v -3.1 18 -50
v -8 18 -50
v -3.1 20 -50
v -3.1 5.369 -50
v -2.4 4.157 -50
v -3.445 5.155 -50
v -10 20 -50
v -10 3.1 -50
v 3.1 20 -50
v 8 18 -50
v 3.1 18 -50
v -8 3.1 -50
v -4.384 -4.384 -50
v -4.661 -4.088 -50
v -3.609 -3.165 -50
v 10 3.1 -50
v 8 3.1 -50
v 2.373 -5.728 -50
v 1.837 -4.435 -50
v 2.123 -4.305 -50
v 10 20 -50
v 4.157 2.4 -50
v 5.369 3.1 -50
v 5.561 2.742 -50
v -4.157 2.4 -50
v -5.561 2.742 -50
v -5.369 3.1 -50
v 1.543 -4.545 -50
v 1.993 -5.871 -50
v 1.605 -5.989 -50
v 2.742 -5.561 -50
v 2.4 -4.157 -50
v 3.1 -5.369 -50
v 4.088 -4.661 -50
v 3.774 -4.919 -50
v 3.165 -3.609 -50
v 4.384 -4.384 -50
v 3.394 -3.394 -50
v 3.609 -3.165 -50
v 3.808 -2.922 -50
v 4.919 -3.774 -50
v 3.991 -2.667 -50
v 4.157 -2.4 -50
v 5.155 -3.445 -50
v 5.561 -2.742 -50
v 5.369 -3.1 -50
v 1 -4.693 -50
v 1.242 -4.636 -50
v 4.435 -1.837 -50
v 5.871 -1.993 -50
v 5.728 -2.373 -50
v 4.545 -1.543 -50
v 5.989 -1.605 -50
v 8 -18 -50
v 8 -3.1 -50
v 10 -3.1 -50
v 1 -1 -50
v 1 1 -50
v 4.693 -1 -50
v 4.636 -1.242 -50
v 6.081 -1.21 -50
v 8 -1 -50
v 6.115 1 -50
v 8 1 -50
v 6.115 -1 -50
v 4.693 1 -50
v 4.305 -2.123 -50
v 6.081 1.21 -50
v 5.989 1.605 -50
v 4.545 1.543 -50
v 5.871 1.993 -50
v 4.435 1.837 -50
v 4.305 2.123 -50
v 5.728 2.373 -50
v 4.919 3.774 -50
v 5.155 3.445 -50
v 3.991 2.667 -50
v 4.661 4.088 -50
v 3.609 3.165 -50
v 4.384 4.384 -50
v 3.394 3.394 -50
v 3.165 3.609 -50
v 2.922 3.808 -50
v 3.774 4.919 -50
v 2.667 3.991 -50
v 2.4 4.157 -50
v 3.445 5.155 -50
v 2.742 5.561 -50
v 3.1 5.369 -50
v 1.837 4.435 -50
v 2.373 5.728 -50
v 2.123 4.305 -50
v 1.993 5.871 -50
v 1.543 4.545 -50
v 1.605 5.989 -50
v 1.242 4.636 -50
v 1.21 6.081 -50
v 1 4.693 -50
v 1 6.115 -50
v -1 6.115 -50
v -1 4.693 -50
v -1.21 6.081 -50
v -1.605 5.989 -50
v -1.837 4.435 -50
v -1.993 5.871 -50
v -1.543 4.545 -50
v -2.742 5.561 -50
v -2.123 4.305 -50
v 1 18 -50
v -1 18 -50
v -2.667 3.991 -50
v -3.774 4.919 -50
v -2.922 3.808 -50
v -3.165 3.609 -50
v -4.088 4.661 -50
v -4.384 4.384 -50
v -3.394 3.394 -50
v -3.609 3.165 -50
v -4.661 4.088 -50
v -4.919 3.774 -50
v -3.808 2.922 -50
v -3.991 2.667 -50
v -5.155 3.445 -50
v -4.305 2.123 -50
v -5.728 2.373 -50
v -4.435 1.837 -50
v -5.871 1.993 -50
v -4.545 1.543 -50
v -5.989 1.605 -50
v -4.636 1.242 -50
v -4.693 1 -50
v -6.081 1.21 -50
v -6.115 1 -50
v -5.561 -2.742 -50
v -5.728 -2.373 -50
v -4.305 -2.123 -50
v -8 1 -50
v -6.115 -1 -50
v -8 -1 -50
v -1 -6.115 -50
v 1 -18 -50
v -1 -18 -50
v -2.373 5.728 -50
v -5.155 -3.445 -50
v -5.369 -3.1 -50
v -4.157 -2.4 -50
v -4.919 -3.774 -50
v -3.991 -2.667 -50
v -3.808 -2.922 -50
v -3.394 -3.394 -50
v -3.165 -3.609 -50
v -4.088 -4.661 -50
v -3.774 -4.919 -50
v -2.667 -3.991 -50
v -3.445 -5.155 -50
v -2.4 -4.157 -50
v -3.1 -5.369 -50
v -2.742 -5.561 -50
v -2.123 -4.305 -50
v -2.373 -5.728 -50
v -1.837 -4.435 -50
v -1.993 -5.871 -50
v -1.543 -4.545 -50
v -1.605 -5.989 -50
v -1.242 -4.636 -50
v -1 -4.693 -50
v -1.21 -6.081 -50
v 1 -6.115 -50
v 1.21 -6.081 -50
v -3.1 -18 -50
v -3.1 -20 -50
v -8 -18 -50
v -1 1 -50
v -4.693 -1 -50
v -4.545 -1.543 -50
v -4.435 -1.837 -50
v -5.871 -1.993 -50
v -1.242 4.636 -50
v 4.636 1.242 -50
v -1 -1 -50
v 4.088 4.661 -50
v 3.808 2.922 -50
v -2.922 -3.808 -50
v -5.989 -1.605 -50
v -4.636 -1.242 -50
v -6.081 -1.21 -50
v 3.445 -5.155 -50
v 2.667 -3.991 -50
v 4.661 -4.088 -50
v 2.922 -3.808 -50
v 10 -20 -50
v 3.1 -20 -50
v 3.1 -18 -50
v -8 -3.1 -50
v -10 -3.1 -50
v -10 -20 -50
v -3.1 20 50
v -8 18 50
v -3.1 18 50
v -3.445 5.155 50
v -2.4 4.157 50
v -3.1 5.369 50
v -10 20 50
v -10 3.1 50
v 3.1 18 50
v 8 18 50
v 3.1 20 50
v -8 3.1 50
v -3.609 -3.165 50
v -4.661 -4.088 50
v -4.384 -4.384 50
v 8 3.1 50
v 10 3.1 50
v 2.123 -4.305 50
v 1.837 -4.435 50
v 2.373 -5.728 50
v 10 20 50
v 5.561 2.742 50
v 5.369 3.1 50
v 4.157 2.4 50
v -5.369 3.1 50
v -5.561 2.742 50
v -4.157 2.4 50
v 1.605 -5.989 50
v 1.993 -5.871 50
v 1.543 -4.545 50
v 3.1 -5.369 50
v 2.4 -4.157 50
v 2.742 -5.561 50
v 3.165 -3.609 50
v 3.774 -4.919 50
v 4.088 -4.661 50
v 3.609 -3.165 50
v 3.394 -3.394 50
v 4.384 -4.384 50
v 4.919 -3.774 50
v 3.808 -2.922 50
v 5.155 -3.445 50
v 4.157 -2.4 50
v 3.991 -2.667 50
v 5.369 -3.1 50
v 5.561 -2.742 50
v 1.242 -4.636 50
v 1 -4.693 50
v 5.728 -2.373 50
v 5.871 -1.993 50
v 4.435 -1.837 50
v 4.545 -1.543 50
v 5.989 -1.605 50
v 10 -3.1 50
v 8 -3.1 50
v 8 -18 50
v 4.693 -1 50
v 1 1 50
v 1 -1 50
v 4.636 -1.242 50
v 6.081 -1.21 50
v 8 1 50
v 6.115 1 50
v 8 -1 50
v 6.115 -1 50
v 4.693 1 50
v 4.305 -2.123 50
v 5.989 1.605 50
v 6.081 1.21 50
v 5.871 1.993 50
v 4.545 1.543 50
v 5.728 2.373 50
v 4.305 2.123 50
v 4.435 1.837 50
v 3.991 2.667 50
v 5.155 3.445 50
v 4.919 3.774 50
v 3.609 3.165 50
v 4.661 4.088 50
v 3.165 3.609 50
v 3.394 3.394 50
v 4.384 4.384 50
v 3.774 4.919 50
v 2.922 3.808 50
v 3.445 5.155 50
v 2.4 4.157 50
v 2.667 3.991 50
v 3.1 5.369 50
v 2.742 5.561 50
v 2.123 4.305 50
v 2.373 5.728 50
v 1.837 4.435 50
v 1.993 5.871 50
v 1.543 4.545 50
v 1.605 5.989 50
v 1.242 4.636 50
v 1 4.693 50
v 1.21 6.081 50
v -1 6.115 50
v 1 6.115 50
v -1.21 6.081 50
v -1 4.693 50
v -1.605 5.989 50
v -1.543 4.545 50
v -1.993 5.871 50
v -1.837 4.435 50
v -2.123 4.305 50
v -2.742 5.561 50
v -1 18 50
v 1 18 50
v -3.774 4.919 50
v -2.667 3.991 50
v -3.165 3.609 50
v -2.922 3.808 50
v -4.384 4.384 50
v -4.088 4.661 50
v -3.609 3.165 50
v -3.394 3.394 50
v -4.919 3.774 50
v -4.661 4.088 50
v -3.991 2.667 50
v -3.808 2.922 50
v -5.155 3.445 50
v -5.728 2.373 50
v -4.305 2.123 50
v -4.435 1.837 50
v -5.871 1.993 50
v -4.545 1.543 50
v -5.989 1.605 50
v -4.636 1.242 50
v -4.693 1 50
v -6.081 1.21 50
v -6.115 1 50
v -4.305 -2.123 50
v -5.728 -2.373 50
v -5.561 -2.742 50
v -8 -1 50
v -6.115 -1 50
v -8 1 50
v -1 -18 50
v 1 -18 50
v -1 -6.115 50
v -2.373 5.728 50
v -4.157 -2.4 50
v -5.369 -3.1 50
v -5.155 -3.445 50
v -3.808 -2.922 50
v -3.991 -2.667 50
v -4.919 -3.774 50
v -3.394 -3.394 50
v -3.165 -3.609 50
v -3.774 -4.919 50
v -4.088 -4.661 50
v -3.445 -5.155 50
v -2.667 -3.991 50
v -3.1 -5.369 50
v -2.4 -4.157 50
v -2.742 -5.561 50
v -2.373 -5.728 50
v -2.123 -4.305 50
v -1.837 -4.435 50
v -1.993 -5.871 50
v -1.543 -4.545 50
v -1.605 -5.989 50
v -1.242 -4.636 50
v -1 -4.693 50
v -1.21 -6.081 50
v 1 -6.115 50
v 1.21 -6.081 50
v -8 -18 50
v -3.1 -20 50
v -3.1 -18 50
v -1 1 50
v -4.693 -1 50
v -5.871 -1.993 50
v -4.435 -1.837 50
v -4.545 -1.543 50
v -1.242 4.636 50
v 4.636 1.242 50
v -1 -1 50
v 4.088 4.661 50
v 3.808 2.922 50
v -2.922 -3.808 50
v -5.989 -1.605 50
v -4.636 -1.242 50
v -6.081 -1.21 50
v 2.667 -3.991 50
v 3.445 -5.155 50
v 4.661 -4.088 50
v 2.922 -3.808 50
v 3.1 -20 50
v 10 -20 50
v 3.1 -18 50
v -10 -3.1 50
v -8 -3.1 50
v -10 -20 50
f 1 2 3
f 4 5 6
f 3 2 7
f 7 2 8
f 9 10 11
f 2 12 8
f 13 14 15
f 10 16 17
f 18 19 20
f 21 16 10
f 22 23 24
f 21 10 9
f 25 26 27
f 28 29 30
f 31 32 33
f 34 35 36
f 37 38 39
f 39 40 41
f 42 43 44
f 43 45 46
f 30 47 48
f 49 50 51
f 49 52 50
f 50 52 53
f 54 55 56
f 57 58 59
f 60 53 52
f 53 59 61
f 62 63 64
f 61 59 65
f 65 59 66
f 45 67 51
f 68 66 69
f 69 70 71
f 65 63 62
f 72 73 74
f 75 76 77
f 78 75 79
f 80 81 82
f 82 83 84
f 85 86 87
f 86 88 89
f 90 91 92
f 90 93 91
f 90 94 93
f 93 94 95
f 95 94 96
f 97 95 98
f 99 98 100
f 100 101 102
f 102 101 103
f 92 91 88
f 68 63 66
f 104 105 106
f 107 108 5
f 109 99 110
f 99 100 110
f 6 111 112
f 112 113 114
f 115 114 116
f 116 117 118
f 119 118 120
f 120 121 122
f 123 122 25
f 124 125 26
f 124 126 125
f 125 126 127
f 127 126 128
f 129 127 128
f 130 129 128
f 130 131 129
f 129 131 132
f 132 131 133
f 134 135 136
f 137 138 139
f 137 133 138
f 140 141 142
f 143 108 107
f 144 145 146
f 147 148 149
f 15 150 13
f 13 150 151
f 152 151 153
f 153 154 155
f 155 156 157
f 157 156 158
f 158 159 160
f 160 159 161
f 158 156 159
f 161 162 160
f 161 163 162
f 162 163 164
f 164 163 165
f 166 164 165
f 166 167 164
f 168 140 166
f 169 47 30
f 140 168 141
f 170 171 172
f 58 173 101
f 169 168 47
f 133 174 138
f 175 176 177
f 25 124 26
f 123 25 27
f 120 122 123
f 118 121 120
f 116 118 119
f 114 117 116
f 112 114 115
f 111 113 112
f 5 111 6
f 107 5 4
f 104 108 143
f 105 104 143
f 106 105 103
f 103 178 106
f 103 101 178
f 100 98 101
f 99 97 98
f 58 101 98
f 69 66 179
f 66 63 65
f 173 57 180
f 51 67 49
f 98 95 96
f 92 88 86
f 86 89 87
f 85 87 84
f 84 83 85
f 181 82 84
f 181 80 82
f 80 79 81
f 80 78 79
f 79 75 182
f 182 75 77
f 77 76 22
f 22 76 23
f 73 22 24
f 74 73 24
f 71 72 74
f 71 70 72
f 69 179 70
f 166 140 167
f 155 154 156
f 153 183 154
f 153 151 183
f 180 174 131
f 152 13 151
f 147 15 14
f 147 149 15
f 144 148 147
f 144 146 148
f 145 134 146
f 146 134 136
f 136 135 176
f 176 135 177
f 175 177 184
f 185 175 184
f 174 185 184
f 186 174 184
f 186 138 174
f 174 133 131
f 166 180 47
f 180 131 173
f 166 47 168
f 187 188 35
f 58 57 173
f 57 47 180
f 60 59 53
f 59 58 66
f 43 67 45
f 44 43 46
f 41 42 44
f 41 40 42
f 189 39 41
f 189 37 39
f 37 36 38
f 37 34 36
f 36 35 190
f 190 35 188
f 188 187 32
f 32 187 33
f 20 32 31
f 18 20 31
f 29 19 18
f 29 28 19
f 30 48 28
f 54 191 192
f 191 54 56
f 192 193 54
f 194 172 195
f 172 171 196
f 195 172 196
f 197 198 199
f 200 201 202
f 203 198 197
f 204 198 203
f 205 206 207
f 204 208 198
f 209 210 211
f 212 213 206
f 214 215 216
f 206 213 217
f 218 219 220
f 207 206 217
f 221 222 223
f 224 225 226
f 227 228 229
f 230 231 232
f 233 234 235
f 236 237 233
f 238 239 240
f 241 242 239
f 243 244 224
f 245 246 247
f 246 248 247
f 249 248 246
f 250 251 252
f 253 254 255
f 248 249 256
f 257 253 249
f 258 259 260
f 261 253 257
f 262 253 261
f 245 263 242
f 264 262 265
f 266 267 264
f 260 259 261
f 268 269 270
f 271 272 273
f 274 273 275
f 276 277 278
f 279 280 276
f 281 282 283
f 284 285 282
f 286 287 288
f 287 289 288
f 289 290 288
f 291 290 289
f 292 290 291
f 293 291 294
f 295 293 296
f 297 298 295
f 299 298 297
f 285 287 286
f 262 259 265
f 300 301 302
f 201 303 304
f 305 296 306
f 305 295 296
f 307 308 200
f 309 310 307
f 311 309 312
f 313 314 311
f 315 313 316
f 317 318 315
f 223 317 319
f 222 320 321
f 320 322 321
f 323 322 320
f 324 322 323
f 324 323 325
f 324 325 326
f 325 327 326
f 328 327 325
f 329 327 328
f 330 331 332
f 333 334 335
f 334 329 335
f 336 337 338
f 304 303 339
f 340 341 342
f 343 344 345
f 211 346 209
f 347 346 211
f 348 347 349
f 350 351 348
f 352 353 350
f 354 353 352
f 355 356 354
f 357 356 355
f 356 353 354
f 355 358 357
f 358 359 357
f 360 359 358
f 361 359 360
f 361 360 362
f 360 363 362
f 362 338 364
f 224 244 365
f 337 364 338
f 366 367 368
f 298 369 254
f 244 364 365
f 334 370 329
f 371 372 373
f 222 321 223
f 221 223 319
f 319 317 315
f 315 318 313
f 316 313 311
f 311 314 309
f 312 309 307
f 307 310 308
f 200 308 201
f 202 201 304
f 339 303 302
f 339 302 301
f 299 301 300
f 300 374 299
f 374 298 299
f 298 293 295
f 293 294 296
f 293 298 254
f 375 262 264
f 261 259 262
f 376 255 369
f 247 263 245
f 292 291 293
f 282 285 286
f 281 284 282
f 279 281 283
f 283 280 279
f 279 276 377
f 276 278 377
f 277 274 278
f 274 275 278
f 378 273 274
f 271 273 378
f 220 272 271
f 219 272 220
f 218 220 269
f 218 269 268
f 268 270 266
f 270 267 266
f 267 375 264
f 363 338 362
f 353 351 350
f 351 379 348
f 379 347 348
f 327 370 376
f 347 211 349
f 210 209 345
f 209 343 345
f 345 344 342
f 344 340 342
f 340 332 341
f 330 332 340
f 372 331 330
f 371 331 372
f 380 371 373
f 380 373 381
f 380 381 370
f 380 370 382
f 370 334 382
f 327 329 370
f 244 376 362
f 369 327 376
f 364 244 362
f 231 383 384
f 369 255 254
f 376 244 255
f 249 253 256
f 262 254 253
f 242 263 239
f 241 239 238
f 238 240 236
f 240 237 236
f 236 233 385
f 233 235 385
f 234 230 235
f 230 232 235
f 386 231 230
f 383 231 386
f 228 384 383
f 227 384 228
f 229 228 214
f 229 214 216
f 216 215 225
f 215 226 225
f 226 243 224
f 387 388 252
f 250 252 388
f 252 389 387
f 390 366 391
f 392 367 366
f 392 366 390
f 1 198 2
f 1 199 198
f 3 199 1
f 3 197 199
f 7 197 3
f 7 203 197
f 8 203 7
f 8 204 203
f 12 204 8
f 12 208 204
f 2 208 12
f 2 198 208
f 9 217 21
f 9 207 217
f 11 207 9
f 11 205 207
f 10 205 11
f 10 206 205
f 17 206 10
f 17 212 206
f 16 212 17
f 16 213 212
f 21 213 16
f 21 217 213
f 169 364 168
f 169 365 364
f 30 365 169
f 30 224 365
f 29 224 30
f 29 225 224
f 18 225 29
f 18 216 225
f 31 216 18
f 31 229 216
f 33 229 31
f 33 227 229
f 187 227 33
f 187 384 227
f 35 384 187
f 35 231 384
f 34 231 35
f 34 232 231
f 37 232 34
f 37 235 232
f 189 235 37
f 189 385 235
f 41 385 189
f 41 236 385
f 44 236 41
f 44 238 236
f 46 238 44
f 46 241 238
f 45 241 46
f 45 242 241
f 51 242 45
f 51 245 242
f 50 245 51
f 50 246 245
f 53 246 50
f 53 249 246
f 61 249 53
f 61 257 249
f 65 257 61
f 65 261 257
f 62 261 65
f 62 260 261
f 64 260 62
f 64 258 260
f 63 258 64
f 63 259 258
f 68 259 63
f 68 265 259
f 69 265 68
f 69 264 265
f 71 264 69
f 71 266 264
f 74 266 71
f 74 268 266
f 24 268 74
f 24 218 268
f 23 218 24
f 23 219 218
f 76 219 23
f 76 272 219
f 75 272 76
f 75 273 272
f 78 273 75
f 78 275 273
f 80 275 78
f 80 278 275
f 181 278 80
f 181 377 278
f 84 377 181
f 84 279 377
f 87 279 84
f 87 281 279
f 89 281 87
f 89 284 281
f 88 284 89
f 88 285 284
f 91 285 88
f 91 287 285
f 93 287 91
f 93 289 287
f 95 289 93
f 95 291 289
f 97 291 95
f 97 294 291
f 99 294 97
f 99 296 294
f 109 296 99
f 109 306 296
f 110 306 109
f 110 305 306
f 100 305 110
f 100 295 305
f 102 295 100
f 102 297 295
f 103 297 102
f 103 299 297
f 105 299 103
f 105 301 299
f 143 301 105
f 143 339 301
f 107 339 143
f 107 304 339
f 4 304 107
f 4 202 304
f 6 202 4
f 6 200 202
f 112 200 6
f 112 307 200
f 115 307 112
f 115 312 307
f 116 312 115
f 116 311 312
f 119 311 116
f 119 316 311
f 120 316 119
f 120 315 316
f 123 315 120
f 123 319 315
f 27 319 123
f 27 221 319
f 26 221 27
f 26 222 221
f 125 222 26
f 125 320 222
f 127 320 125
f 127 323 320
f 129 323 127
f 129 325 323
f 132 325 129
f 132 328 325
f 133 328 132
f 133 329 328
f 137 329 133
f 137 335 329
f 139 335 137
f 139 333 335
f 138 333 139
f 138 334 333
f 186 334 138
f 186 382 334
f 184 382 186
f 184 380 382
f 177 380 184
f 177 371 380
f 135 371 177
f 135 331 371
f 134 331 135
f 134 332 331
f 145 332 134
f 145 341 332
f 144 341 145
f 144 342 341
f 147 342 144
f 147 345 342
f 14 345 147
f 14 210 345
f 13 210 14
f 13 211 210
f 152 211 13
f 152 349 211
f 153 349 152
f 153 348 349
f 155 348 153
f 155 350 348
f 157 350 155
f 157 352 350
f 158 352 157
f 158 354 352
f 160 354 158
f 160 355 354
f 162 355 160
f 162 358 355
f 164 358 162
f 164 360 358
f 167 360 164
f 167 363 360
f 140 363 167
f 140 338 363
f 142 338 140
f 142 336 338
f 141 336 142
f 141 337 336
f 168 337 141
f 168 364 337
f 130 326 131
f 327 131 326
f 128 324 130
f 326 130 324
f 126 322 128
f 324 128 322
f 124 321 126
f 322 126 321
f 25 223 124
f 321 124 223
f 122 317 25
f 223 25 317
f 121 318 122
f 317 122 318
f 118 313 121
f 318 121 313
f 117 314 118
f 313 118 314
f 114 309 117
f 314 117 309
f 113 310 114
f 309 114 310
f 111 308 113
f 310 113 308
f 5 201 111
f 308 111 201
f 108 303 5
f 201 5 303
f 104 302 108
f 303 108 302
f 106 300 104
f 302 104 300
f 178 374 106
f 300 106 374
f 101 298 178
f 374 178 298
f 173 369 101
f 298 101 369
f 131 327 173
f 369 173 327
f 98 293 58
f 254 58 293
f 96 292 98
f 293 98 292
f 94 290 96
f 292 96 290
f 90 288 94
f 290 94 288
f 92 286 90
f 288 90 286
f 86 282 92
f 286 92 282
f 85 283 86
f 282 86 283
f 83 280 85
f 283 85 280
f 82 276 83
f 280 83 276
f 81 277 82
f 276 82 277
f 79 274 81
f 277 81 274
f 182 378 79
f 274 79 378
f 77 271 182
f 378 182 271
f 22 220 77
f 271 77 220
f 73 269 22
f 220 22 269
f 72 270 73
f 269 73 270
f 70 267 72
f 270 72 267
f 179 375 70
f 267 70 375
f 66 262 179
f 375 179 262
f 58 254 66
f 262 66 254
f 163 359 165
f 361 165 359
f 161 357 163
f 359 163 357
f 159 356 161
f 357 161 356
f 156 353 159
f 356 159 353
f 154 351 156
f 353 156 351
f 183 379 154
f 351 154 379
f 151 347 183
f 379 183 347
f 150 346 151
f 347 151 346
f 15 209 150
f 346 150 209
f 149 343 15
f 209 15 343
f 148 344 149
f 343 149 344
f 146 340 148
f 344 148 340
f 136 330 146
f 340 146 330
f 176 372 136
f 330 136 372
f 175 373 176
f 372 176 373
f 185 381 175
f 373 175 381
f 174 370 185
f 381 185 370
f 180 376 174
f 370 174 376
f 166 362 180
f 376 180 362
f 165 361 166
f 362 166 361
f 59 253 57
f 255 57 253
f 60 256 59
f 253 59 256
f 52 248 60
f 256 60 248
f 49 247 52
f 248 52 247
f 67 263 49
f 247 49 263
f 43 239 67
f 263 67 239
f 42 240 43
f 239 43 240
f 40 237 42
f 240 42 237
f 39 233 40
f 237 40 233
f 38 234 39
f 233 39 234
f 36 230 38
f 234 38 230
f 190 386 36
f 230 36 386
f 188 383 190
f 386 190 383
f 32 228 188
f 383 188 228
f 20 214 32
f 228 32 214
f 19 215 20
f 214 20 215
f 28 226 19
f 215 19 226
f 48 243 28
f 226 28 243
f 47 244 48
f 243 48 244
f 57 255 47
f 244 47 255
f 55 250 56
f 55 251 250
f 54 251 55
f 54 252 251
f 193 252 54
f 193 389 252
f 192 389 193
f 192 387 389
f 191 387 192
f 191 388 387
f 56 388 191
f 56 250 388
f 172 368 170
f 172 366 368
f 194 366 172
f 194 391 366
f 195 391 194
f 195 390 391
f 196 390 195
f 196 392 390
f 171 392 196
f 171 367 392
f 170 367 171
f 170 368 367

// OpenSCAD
// 20x40 aluminium T-slot extrusion profile, 100mm long (single connected solid)

$fn = 96;

module extrusion_2040(len=100) {
    linear_extrude(height=len, center=true, convexity=20)
        extrusion_2040_cross_section();
}

module extrusion_2040_cross_section() {
    // Overall size (mm)
    w = 20;
    h = 40;

    // Typical-ish 2040 features (kept simple but recognizable)
    wall = 2.0;          // outer wall thickness
    slot_w = 6.2;        // slot opening width
    slot_depth = 6.0;    // depth from outer face
    throat_w = 3.2;      // narrow throat width
    throat_depth = 2.0;  // throat depth from outer face

    bore_r = 4.2;        // central bore radius

    // Internal webs (ensure one connected solid)
    web = 2.0;

    // Derived
    inner_w = w - 2*wall;
    inner_h = h - 2*wall;

    // Keep a minimum ring around the bore so it doesn't disconnect from webs
    bore_clear = 0.6;

    // Build as: (outer body) minus (slots + inner void + bore), then add webs back
    union() {
        difference() {
            // Outer boundary
            square([w, h], center=true);

            // Inner cavity (hollow core)
            square([inner_w, inner_h], center=true);

            // Central bore
            circle(r=bore_r);

            // T-slots on all four faces (cut from outside inward)
            // Right face
            translate([ w/2 - slot_depth/2, 0])
                square([slot_depth, slot_w], center=true);
            translate([ w/2 - throat_depth/2, 0])
                square([throat_depth, throat_w], center=true);

            // Left face
            translate([-w/2 + slot_depth/2, 0])
                square([slot_depth, slot_w], center=true);
            translate([-w/2 + throat_depth/2, 0])
                square([throat_depth, throat_w], center=true);

            // Top face
            translate([0,  h/2 - slot_depth/2])
                square([slot_w, slot_depth], center=true);
            translate([0,  h/2 - throat_depth/2])
                square([throat_w, throat_depth], center=true);

            // Bottom face
            translate([0, -h/2 + slot_depth/2])
                square([slot_w, slot_depth], center=true);
            translate([0, -h/2 + throat_depth/2])
                square([throat_w, throat_depth], center=true);
        }

        // Internal webs (added back so the profile is not just a hollow tube)
        // Vertical web
        square([web, inner_h], center=true);

        // Horizontal web
        square([inner_w, web], center=true);

        // Small ring around bore to ensure robust connectivity between webs and outer body
        difference() {
            circle(r=bore_r + wall);
            circle(r=bore_r + bore_clear);
        }
    }
}

extrusion_2040(100);
